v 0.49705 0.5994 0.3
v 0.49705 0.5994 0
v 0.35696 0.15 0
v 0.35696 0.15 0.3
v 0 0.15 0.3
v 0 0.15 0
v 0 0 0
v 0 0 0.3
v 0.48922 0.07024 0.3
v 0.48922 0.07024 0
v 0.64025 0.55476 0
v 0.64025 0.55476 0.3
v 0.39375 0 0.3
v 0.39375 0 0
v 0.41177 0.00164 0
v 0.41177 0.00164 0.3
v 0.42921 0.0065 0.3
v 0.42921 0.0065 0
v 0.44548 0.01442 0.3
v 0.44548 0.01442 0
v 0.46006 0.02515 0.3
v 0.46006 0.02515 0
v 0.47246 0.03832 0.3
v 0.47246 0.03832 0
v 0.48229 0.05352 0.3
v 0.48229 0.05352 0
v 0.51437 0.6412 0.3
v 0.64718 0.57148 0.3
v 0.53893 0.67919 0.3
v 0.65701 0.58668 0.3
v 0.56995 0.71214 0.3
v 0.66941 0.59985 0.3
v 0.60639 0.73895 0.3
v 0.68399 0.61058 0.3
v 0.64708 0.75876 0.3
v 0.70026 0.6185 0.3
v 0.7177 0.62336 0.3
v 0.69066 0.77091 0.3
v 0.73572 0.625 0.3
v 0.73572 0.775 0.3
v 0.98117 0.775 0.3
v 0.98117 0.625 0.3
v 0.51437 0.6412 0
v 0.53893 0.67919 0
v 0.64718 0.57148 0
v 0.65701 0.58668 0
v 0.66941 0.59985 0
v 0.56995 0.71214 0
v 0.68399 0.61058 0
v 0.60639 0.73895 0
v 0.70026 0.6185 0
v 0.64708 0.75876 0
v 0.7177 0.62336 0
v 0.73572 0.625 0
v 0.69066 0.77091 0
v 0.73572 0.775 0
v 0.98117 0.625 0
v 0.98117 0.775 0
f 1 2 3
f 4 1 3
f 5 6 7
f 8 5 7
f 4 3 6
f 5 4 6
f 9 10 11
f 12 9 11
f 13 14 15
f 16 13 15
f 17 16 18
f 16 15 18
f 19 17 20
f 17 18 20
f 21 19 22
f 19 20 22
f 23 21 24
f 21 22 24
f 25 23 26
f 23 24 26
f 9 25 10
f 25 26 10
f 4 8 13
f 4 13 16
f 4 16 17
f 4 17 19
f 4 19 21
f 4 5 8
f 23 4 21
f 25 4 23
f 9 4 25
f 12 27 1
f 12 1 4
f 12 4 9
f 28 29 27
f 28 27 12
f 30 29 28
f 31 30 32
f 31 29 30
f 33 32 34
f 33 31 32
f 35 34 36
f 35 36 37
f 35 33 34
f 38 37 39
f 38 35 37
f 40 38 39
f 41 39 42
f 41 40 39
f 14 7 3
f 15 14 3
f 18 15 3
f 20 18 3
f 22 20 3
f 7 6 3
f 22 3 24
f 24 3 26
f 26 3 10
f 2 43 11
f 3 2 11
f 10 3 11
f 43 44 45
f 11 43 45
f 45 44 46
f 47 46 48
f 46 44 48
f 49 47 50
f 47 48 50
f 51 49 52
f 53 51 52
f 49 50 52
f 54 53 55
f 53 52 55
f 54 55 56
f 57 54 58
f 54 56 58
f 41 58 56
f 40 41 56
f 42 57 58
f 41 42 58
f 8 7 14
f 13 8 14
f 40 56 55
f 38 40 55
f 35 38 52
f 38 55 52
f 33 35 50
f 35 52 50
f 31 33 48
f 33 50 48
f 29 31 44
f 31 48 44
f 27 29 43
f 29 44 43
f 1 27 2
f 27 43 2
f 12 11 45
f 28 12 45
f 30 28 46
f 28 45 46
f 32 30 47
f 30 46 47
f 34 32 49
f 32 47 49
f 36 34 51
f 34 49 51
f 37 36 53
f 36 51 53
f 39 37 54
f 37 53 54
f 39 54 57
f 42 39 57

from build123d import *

# Parameters (mm, degrees)
BOSS_EXTRU_1_DEPTH = 0.3


with BuildPart() as part:
    # Esquisse1 → Boss.-Extru.1 (new body)
    with BuildSketch(Plane.XY):
        with BuildLine():
            Line((0, 0), (0.393749669, 0))
            ThreePointArc((0.393749669, 0), (0.45301211, 0.019452107), (0.489218964, 0.070240738))
            Line((0.489218964, 0.070240738), (0.64025091, 0.554759262))
            ThreePointArc((0.64025091, 0.554759262), (0.676457764, 0.605547893), (0.735720205, 0.625))
            Line((0.735720205, 0.625), (0.981168201, 0.625))
            Line((0.981168201, 0.625), (0.981168201, 0.775))
            Line((0.981168201, 0.775), (0.735720205, 0.775))
            ThreePointArc((0.735720205, 0.775), (0.587564103, 0.726369733), (0.497046967, 0.599398154))
            Line((0.497046967, 0.599398154), (0.356962586, 0.15))
            Line((0.356962586, 0.15), (0, 0.15))
            Line((0, 0.15), (0, 0))
        make_face()
    extrude(amount=BOSS_EXTRU_1_DEPTH)


solid = part.part
